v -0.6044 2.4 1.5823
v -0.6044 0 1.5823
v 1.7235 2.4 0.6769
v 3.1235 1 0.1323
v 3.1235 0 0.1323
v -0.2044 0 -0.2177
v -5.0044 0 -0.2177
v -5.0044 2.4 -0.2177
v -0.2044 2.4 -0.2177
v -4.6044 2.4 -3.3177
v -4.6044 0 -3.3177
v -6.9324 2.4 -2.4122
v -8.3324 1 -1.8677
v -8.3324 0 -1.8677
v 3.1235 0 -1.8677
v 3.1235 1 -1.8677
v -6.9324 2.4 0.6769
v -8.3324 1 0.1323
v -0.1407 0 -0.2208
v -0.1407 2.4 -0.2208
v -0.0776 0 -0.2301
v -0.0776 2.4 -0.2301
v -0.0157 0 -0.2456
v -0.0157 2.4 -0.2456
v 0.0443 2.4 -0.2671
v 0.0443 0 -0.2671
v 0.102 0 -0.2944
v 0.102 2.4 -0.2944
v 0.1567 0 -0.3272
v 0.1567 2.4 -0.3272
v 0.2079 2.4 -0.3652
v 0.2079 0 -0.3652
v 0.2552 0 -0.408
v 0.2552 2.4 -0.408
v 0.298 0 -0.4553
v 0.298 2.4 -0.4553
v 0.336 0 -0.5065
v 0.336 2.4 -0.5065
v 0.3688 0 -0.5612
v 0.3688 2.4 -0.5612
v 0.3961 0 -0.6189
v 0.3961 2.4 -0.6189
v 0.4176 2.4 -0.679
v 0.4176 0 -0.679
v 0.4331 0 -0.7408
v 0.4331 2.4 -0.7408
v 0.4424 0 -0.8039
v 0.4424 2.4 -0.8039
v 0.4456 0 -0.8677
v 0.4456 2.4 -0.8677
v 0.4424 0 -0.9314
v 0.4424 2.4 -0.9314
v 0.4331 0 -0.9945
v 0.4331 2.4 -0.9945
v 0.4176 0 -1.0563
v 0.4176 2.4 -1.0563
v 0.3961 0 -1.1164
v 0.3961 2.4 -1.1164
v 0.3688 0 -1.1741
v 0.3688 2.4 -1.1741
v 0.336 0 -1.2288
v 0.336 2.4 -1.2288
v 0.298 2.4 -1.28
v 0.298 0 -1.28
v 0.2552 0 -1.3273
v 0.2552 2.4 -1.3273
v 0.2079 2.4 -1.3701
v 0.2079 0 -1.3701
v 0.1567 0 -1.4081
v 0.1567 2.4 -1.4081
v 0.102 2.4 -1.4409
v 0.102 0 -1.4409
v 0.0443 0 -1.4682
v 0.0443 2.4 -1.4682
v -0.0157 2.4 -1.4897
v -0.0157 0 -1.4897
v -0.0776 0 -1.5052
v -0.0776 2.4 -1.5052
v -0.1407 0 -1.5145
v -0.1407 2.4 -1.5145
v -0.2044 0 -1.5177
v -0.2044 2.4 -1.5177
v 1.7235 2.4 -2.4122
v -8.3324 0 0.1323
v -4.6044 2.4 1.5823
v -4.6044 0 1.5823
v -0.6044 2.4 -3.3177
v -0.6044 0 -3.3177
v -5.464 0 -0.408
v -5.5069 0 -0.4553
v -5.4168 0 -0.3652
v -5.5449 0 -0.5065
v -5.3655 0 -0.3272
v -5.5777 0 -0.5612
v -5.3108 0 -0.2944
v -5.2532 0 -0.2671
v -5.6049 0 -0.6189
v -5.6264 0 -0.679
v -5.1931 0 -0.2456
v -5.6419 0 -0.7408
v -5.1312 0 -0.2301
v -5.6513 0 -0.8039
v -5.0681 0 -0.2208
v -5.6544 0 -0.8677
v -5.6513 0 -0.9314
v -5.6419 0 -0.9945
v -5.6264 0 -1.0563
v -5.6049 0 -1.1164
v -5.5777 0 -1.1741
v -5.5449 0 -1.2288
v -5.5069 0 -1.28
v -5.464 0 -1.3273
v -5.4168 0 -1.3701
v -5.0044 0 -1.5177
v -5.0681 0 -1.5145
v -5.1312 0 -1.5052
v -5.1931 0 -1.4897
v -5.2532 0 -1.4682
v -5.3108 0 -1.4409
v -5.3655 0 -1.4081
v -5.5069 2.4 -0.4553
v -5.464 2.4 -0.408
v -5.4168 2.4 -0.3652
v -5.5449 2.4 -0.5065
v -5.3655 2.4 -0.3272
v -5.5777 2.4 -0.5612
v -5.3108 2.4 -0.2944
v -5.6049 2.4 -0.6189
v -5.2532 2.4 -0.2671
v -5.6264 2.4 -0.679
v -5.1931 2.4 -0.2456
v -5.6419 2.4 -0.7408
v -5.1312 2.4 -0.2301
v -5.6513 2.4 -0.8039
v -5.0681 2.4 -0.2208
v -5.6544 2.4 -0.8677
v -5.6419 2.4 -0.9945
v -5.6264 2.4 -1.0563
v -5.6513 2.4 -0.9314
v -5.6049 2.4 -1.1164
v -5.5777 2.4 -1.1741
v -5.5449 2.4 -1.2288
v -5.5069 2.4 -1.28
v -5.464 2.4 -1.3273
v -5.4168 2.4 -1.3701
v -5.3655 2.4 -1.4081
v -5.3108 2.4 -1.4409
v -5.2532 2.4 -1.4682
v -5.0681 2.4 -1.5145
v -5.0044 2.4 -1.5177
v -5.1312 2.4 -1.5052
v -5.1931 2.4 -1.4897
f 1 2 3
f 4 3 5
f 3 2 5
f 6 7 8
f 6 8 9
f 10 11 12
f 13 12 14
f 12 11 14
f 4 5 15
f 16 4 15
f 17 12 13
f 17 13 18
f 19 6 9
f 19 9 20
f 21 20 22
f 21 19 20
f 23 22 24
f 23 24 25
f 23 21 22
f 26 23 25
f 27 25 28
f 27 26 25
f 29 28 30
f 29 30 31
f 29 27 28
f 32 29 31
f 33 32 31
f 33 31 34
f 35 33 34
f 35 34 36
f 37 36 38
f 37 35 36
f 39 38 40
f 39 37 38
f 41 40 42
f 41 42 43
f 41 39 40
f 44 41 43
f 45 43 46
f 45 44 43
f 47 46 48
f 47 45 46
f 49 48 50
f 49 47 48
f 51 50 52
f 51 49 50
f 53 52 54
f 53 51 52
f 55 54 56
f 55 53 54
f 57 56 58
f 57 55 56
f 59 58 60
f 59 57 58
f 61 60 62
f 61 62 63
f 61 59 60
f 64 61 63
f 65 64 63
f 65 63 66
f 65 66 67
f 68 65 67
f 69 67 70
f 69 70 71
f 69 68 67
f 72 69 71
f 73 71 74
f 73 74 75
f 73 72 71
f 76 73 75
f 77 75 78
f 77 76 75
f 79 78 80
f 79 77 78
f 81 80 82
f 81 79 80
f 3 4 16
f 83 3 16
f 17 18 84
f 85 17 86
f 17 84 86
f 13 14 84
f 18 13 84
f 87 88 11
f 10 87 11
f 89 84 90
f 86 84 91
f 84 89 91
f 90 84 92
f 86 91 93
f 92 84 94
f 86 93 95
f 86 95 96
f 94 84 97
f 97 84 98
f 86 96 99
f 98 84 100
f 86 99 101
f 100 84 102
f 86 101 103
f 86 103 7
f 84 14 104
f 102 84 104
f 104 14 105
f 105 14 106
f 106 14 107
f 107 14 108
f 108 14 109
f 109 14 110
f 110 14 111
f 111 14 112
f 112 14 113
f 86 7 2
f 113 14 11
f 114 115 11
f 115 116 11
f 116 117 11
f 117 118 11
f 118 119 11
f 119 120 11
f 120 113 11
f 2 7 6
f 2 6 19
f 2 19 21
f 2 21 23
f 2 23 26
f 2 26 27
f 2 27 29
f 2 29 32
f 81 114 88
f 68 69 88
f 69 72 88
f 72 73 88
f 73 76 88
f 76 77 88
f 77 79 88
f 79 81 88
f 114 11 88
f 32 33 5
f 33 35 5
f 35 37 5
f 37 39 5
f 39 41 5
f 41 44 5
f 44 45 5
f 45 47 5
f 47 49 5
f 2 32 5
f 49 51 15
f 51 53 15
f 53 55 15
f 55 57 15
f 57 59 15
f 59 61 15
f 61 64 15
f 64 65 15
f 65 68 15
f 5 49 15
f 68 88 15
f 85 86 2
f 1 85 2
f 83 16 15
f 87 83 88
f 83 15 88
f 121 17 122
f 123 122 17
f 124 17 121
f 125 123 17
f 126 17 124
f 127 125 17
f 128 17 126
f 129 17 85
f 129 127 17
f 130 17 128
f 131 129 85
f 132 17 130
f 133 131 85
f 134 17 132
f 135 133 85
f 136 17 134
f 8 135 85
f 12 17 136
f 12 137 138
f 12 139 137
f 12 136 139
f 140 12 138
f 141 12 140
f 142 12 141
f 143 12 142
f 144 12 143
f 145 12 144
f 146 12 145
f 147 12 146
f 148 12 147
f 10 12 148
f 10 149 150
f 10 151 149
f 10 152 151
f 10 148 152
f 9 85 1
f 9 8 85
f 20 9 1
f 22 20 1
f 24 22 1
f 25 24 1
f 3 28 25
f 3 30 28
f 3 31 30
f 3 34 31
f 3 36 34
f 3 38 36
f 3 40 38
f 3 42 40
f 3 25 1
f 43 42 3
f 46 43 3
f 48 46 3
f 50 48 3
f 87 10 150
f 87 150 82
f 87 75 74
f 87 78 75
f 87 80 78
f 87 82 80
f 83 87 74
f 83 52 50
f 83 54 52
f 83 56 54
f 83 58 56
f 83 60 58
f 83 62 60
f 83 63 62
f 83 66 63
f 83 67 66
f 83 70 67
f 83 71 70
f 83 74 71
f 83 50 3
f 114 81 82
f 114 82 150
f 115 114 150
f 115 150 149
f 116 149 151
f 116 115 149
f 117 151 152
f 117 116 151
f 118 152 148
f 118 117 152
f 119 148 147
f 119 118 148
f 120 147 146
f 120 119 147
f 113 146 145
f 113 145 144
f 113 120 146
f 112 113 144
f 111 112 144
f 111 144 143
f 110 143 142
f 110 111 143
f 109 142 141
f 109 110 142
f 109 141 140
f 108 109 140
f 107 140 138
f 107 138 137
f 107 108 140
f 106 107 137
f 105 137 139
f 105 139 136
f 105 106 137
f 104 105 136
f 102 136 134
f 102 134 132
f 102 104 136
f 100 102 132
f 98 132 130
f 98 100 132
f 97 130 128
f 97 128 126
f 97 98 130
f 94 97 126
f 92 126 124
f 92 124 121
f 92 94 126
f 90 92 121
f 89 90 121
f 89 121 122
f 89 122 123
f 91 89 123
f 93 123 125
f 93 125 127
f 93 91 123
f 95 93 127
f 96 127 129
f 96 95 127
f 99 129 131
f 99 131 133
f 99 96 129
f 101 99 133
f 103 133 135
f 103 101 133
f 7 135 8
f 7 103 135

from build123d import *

# Parameters (mm, degrees)
BOSS_EXTRU_2_DEPTH = 2.4
CHANFREIN3_SIZE    = 1.4
CHANFREIN4_SIZE    = 1.4


with BuildPart() as part:
    # Esquisse2 → Boss.-Extru.2 (new body)
    with BuildSketch(Plane(origin=(0, 0, 0), x_dir=(1, 0, 0), z_dir=(0, 1, 0))):
        Polygon((-0.604426001, 3.317657231), (-4.604426001, 3.317657231), (-8.332361087, 1.867657231), (-8.332361087, -0.132342769), (-4.604426001, -1.582342769), (-0.604426001, -1.582342769), (3.123509084, -0.132342769), (3.123509084, 1.867657231), align=None)
        with BuildLine():
            Line((-0.204426001, 1.517657231), (-5.004426001, 1.517657231))
            ThreePointArc((-5.004426001, 1.517657231), (-5.654426001, 0.867657231), (-5.004426001, 0.217657231))
            Line((-5.004426001, 0.217657231), (-0.204426001, 0.217657231))
            ThreePointArc((-0.204426001, 0.217657231), (0.445573999, 0.867657231), (-0.204426001, 1.517657231))
        make_face(mode=Mode.SUBTRACT)
    extrude(amount=BOSS_EXTRU_2_DEPTH)

    # Chanfrein3
    chanfrein3_edges = [part.edges().sort_by_distance(p)[0] for p in [
        (-8.332361087, 2.4, -0.867657231),
    ]]
    chamfer(chanfrein3_edges, length=CHANFREIN3_SIZE)

    # Chanfrein4
    chanfrein4_edges = [part.edges().sort_by_distance(p)[0] for p in [
        (3.123509084, 2.4, -0.867657231),
    ]]
    chamfer(chanfrein4_edges, length=CHANFREIN4_SIZE)


solid = part.part
